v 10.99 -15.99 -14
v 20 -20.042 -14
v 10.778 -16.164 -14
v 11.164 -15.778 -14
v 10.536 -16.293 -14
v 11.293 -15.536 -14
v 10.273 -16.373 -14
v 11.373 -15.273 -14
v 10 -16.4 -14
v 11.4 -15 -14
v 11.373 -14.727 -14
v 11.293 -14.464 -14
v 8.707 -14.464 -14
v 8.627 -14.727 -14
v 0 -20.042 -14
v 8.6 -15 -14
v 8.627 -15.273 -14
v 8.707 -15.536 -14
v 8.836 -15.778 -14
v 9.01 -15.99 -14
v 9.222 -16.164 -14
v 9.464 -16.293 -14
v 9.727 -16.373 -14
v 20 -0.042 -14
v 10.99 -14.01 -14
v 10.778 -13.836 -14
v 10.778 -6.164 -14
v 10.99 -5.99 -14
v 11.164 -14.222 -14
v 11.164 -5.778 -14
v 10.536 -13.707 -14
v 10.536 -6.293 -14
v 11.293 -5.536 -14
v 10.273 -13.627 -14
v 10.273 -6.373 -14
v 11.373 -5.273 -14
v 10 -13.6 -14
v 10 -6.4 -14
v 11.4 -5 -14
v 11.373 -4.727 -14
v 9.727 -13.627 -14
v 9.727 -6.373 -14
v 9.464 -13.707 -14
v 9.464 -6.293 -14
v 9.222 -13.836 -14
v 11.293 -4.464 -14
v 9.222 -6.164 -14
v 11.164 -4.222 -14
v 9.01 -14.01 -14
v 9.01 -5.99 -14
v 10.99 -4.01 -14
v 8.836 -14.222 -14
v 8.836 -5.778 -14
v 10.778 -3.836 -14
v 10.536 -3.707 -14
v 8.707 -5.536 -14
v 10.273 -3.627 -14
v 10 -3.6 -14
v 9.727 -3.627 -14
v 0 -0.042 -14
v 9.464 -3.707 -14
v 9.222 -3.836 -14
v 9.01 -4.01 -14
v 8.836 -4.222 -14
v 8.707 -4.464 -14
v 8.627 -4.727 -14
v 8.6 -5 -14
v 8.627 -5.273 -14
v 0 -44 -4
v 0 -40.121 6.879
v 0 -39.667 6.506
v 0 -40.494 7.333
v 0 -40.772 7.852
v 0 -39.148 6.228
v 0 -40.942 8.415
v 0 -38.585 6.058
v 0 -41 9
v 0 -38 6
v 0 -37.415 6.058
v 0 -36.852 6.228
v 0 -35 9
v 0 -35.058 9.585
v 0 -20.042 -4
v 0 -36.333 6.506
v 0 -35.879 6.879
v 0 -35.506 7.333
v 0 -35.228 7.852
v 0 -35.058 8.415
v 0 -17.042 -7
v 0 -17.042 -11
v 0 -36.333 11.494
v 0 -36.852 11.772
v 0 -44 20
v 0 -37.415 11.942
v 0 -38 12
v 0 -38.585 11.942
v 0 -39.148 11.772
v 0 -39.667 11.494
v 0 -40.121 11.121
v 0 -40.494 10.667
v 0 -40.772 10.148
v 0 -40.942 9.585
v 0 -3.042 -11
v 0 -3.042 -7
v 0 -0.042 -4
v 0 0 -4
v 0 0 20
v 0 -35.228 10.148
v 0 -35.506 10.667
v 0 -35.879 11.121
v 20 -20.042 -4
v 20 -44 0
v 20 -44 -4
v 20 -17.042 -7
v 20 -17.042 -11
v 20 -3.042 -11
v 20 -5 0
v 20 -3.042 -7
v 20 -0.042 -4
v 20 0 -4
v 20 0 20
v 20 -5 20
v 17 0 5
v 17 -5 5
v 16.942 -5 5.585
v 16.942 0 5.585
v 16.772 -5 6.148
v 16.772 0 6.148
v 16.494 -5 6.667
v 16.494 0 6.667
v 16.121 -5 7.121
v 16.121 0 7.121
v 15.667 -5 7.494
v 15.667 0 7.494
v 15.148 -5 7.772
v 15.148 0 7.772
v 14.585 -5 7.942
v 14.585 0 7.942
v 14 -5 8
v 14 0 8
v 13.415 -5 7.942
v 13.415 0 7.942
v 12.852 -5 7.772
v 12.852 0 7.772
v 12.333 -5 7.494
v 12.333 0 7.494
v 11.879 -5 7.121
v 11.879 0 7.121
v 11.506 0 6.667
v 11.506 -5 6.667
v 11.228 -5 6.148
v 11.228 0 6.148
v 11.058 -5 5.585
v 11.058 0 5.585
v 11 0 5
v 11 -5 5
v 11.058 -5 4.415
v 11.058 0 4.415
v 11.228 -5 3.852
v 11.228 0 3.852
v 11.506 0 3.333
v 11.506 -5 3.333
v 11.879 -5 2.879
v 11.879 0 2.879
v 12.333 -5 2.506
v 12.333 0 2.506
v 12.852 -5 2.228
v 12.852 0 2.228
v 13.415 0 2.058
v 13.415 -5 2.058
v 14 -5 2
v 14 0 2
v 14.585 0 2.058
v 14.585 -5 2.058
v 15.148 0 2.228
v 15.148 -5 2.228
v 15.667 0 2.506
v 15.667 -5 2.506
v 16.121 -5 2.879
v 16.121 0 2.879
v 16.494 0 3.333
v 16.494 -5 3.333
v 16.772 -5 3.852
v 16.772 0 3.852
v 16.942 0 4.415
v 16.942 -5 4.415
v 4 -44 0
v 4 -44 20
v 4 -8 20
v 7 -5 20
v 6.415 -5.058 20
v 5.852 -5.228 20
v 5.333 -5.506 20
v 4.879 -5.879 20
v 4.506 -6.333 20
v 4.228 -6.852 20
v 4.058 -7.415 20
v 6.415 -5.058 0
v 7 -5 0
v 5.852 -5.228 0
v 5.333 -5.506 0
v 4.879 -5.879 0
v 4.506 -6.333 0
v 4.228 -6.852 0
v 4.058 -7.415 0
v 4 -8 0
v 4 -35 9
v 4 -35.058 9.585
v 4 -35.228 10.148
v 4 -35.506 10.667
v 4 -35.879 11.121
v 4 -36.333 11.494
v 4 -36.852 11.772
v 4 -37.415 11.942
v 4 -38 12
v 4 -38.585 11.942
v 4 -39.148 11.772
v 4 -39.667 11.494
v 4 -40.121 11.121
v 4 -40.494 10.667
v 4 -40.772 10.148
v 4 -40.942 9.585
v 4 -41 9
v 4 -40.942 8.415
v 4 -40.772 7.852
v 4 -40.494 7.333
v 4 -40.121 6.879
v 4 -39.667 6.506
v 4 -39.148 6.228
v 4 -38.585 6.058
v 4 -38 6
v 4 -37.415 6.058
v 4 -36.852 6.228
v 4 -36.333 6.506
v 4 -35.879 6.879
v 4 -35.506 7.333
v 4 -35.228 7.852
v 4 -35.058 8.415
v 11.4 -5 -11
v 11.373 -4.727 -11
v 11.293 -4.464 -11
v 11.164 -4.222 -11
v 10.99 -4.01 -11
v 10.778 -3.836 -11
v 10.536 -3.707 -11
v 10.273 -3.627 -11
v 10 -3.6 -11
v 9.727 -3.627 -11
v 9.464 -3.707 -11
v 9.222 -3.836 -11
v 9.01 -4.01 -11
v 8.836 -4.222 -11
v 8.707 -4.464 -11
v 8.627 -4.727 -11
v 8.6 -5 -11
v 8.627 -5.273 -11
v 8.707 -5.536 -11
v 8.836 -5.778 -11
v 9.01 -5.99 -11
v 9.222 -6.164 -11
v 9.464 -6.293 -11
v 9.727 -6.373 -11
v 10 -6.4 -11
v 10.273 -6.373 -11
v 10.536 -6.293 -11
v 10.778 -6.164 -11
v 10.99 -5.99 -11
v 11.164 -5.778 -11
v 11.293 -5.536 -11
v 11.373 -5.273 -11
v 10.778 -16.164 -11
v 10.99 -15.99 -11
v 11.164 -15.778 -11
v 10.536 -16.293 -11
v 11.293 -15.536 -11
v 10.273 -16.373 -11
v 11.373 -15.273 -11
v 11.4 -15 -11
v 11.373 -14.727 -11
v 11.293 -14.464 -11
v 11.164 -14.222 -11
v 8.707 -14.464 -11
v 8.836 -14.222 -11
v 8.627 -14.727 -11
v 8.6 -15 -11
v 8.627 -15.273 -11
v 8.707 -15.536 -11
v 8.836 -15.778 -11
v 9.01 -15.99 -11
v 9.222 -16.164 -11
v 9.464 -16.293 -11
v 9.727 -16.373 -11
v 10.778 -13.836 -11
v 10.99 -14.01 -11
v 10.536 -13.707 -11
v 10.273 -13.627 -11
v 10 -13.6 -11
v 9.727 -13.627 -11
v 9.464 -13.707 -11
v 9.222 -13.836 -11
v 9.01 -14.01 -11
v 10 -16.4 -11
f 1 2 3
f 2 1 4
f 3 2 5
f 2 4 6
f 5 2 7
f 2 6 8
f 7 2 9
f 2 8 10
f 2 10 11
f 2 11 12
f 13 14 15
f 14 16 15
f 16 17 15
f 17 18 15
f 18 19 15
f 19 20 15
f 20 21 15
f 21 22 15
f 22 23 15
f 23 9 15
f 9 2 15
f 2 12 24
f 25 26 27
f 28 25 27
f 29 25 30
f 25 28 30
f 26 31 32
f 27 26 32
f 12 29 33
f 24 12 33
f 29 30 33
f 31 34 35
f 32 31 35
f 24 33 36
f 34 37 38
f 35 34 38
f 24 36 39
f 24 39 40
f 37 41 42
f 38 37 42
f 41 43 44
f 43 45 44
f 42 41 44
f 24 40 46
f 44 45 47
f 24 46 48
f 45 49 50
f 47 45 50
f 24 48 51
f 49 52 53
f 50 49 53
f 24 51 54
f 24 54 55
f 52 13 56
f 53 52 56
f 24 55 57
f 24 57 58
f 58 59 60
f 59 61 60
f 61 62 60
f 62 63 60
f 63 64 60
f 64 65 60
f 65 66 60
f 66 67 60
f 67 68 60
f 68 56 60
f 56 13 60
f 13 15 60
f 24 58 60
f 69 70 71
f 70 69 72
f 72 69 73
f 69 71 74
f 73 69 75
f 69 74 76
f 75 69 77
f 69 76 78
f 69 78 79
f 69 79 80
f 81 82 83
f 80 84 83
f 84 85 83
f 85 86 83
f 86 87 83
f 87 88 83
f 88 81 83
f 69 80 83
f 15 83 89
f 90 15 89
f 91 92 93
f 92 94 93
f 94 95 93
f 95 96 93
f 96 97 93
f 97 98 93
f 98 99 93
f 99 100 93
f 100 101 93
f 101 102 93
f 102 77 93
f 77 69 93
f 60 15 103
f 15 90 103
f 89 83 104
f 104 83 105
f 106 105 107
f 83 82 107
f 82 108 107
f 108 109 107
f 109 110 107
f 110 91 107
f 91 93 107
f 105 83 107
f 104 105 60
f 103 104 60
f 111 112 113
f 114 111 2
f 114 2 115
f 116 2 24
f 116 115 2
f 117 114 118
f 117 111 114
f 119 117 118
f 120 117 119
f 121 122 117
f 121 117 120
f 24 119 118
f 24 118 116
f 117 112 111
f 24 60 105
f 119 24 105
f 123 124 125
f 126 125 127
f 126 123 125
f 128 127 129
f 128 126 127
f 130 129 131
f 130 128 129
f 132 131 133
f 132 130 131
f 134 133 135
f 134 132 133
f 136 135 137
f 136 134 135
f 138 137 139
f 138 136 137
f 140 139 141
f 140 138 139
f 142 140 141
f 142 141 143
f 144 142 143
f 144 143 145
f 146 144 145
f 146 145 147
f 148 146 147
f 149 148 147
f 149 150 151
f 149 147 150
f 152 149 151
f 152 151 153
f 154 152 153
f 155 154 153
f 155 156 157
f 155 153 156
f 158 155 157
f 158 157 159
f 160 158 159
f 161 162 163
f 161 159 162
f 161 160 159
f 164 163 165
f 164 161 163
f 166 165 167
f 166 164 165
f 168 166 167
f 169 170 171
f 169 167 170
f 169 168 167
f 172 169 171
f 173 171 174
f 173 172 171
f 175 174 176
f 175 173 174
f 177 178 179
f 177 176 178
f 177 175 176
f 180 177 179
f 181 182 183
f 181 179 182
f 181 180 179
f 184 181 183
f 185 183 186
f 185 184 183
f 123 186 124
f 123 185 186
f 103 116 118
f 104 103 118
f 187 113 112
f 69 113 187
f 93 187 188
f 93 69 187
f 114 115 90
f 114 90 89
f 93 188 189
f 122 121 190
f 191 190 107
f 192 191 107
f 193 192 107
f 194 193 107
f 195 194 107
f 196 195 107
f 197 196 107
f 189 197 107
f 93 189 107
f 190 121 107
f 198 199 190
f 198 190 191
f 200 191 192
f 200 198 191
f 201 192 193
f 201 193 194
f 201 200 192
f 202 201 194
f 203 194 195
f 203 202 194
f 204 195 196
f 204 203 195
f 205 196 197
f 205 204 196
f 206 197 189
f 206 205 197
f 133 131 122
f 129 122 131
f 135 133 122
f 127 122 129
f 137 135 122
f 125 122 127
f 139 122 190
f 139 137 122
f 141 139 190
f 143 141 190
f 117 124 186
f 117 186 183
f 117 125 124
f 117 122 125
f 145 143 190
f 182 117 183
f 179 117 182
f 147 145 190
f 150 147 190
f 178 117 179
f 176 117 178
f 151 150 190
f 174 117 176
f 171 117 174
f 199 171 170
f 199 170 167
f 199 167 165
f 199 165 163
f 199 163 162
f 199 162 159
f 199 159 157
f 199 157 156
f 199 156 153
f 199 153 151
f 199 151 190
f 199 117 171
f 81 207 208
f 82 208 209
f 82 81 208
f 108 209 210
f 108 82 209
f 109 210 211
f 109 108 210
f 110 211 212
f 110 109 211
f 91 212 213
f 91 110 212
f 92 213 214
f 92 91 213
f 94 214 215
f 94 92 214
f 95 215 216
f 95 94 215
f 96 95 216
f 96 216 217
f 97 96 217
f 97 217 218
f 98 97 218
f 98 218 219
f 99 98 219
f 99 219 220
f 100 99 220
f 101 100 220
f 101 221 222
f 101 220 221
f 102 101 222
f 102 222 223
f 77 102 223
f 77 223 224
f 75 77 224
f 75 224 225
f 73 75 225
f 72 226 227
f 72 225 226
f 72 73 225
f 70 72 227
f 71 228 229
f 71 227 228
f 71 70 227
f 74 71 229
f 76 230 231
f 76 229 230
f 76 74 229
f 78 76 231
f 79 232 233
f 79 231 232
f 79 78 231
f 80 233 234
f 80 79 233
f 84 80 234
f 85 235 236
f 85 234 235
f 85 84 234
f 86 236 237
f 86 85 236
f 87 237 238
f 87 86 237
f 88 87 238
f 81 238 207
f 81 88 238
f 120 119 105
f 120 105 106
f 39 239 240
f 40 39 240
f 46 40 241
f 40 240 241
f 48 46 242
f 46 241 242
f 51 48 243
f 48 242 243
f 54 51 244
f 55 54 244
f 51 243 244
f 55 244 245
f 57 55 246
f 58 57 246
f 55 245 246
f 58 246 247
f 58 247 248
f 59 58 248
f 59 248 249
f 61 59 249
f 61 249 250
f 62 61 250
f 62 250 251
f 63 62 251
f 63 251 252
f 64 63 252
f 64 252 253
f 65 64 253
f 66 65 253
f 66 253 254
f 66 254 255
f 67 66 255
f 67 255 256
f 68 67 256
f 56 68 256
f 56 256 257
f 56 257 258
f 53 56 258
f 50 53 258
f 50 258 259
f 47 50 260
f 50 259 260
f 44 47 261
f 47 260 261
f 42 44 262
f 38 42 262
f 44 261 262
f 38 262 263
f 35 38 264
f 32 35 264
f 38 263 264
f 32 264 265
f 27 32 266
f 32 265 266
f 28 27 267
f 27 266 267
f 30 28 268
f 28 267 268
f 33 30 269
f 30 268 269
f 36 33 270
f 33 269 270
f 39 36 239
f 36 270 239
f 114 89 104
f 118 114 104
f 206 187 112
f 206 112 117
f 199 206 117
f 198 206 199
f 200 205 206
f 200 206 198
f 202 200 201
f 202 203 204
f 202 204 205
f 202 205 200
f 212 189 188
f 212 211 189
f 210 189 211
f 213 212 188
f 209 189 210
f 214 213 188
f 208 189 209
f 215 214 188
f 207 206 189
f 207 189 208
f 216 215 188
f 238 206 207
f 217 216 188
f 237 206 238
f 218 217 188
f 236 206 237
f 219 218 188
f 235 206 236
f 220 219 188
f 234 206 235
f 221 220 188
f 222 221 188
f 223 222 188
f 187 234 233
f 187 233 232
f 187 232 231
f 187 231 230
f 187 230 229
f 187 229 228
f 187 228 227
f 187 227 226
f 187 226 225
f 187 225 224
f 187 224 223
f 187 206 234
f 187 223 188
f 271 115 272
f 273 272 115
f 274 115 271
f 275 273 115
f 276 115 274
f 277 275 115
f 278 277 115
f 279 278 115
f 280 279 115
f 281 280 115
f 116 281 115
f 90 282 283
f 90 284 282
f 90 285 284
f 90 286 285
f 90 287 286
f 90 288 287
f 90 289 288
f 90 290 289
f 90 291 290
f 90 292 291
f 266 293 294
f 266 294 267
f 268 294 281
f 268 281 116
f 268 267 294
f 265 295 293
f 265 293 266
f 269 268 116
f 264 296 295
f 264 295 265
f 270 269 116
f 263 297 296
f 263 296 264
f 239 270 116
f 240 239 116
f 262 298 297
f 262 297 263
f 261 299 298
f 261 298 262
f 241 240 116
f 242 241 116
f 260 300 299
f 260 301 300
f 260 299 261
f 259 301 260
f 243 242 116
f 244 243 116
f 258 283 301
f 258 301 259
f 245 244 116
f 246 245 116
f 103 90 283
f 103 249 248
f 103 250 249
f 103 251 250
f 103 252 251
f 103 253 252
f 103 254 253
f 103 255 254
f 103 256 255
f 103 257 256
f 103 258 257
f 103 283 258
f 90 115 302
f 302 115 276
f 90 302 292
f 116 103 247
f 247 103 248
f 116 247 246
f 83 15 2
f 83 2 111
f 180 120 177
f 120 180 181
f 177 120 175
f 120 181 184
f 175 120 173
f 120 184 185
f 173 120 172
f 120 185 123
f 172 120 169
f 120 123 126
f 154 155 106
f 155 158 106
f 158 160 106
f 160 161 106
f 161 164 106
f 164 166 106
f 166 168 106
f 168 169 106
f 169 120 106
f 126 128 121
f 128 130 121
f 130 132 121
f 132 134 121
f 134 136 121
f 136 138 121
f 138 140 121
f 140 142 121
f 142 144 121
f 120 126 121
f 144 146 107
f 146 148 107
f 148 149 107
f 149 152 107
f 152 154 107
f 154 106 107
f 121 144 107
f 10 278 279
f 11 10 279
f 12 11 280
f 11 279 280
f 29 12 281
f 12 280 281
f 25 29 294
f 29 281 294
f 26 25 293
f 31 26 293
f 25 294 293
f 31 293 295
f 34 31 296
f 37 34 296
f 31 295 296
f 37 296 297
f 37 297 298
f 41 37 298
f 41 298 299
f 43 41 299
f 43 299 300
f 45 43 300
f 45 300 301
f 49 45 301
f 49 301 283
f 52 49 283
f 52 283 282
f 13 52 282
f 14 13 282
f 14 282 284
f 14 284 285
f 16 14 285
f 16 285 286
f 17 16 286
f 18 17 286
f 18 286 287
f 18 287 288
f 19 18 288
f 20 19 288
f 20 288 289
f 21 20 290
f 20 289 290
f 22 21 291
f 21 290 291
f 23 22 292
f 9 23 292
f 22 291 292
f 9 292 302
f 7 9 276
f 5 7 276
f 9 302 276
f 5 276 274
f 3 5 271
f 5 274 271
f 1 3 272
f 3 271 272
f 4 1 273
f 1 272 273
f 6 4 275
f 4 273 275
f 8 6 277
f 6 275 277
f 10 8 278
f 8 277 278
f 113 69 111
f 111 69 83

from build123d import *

# Parameters (mm, degrees)
PAD023_DEPTH    = 20
SKETCH041_R     = 3
POCKET012_DEPTH = 44.001
SKETCH042_R     = 3
POCKET013_DEPTH = 5
SKETCH044_W     = 44
SKETCH044_H     = 4
PAD025_DEPTH    = 20
SKETCH045_W     = 20
SKETCH045_H     = 10
SKETCH045_W_2   = 14
SKETCH045_H_2   = 4
PAD026_DEPTH    = 20
SKETCH046_R     = 1.4
POCKET014_DEPTH = 6.001


with BuildPart() as part:
    # Sketch040 → Pad023 (new body)
    with BuildSketch(Plane.XY):
        with BuildLine():
            Line((0, -44), (0, 0))
            Line((0, 0), (20, 0))
            Line((20, 0), (20, -5))
            Line((20, -5), (7, -5))
            ThreePointArc((7, -5), (4.87868, -5.87868), (4, -8))
            Line((4, -8), (4, -44))
            Line((4, -44), (0, -44))
        make_face()
    extrude(amount=PAD023_DEPTH)

    # Sketch041 → Pocket012 (cut, through all)
    with BuildSketch(Plane.XZ):
        with Locations((14, 5)):
            Circle(SKETCH041_R)
    extrude(amount=POCKET012_DEPTH, mode=Mode.SUBTRACT)

    # Sketch042 → Pocket013 (cut)
    with BuildSketch(Plane.YZ):
        with Locations((-38, 9)):
            Circle(SKETCH042_R)
    extrude(amount=POCKET013_DEPTH, mode=Mode.SUBTRACT)

    # Sketch044 → Pad025 (join)
    with BuildSketch(Plane.YZ):
        with Locations((-22, -2)):
            Rectangle(SKETCH044_W, SKETCH044_H)
    extrude(amount=PAD025_DEPTH)

    # Sketch045 → Pad026 (join)
    with BuildSketch(Plane.YZ):
        with Locations((-10.041618, -9)):
            Rectangle(SKETCH045_W, SKETCH045_H)
        with Locations((-10.041618, -9)):
            Rectangle(SKETCH045_W_2, SKETCH045_H_2, mode=Mode.SUBTRACT)
    extrude(amount=PAD026_DEPTH)

    # Sketch046 → Pocket014 (cut, through all)
    with BuildSketch(Plane.XY.offset(-8)):
        with Locations((10, -15)):
            Circle(SKETCH046_R)
        with Locations((10, -5)):
            Circle(SKETCH046_R)
    extrude(amount=-POCKET014_DEPTH, mode=Mode.SUBTRACT)


solid = part.part
